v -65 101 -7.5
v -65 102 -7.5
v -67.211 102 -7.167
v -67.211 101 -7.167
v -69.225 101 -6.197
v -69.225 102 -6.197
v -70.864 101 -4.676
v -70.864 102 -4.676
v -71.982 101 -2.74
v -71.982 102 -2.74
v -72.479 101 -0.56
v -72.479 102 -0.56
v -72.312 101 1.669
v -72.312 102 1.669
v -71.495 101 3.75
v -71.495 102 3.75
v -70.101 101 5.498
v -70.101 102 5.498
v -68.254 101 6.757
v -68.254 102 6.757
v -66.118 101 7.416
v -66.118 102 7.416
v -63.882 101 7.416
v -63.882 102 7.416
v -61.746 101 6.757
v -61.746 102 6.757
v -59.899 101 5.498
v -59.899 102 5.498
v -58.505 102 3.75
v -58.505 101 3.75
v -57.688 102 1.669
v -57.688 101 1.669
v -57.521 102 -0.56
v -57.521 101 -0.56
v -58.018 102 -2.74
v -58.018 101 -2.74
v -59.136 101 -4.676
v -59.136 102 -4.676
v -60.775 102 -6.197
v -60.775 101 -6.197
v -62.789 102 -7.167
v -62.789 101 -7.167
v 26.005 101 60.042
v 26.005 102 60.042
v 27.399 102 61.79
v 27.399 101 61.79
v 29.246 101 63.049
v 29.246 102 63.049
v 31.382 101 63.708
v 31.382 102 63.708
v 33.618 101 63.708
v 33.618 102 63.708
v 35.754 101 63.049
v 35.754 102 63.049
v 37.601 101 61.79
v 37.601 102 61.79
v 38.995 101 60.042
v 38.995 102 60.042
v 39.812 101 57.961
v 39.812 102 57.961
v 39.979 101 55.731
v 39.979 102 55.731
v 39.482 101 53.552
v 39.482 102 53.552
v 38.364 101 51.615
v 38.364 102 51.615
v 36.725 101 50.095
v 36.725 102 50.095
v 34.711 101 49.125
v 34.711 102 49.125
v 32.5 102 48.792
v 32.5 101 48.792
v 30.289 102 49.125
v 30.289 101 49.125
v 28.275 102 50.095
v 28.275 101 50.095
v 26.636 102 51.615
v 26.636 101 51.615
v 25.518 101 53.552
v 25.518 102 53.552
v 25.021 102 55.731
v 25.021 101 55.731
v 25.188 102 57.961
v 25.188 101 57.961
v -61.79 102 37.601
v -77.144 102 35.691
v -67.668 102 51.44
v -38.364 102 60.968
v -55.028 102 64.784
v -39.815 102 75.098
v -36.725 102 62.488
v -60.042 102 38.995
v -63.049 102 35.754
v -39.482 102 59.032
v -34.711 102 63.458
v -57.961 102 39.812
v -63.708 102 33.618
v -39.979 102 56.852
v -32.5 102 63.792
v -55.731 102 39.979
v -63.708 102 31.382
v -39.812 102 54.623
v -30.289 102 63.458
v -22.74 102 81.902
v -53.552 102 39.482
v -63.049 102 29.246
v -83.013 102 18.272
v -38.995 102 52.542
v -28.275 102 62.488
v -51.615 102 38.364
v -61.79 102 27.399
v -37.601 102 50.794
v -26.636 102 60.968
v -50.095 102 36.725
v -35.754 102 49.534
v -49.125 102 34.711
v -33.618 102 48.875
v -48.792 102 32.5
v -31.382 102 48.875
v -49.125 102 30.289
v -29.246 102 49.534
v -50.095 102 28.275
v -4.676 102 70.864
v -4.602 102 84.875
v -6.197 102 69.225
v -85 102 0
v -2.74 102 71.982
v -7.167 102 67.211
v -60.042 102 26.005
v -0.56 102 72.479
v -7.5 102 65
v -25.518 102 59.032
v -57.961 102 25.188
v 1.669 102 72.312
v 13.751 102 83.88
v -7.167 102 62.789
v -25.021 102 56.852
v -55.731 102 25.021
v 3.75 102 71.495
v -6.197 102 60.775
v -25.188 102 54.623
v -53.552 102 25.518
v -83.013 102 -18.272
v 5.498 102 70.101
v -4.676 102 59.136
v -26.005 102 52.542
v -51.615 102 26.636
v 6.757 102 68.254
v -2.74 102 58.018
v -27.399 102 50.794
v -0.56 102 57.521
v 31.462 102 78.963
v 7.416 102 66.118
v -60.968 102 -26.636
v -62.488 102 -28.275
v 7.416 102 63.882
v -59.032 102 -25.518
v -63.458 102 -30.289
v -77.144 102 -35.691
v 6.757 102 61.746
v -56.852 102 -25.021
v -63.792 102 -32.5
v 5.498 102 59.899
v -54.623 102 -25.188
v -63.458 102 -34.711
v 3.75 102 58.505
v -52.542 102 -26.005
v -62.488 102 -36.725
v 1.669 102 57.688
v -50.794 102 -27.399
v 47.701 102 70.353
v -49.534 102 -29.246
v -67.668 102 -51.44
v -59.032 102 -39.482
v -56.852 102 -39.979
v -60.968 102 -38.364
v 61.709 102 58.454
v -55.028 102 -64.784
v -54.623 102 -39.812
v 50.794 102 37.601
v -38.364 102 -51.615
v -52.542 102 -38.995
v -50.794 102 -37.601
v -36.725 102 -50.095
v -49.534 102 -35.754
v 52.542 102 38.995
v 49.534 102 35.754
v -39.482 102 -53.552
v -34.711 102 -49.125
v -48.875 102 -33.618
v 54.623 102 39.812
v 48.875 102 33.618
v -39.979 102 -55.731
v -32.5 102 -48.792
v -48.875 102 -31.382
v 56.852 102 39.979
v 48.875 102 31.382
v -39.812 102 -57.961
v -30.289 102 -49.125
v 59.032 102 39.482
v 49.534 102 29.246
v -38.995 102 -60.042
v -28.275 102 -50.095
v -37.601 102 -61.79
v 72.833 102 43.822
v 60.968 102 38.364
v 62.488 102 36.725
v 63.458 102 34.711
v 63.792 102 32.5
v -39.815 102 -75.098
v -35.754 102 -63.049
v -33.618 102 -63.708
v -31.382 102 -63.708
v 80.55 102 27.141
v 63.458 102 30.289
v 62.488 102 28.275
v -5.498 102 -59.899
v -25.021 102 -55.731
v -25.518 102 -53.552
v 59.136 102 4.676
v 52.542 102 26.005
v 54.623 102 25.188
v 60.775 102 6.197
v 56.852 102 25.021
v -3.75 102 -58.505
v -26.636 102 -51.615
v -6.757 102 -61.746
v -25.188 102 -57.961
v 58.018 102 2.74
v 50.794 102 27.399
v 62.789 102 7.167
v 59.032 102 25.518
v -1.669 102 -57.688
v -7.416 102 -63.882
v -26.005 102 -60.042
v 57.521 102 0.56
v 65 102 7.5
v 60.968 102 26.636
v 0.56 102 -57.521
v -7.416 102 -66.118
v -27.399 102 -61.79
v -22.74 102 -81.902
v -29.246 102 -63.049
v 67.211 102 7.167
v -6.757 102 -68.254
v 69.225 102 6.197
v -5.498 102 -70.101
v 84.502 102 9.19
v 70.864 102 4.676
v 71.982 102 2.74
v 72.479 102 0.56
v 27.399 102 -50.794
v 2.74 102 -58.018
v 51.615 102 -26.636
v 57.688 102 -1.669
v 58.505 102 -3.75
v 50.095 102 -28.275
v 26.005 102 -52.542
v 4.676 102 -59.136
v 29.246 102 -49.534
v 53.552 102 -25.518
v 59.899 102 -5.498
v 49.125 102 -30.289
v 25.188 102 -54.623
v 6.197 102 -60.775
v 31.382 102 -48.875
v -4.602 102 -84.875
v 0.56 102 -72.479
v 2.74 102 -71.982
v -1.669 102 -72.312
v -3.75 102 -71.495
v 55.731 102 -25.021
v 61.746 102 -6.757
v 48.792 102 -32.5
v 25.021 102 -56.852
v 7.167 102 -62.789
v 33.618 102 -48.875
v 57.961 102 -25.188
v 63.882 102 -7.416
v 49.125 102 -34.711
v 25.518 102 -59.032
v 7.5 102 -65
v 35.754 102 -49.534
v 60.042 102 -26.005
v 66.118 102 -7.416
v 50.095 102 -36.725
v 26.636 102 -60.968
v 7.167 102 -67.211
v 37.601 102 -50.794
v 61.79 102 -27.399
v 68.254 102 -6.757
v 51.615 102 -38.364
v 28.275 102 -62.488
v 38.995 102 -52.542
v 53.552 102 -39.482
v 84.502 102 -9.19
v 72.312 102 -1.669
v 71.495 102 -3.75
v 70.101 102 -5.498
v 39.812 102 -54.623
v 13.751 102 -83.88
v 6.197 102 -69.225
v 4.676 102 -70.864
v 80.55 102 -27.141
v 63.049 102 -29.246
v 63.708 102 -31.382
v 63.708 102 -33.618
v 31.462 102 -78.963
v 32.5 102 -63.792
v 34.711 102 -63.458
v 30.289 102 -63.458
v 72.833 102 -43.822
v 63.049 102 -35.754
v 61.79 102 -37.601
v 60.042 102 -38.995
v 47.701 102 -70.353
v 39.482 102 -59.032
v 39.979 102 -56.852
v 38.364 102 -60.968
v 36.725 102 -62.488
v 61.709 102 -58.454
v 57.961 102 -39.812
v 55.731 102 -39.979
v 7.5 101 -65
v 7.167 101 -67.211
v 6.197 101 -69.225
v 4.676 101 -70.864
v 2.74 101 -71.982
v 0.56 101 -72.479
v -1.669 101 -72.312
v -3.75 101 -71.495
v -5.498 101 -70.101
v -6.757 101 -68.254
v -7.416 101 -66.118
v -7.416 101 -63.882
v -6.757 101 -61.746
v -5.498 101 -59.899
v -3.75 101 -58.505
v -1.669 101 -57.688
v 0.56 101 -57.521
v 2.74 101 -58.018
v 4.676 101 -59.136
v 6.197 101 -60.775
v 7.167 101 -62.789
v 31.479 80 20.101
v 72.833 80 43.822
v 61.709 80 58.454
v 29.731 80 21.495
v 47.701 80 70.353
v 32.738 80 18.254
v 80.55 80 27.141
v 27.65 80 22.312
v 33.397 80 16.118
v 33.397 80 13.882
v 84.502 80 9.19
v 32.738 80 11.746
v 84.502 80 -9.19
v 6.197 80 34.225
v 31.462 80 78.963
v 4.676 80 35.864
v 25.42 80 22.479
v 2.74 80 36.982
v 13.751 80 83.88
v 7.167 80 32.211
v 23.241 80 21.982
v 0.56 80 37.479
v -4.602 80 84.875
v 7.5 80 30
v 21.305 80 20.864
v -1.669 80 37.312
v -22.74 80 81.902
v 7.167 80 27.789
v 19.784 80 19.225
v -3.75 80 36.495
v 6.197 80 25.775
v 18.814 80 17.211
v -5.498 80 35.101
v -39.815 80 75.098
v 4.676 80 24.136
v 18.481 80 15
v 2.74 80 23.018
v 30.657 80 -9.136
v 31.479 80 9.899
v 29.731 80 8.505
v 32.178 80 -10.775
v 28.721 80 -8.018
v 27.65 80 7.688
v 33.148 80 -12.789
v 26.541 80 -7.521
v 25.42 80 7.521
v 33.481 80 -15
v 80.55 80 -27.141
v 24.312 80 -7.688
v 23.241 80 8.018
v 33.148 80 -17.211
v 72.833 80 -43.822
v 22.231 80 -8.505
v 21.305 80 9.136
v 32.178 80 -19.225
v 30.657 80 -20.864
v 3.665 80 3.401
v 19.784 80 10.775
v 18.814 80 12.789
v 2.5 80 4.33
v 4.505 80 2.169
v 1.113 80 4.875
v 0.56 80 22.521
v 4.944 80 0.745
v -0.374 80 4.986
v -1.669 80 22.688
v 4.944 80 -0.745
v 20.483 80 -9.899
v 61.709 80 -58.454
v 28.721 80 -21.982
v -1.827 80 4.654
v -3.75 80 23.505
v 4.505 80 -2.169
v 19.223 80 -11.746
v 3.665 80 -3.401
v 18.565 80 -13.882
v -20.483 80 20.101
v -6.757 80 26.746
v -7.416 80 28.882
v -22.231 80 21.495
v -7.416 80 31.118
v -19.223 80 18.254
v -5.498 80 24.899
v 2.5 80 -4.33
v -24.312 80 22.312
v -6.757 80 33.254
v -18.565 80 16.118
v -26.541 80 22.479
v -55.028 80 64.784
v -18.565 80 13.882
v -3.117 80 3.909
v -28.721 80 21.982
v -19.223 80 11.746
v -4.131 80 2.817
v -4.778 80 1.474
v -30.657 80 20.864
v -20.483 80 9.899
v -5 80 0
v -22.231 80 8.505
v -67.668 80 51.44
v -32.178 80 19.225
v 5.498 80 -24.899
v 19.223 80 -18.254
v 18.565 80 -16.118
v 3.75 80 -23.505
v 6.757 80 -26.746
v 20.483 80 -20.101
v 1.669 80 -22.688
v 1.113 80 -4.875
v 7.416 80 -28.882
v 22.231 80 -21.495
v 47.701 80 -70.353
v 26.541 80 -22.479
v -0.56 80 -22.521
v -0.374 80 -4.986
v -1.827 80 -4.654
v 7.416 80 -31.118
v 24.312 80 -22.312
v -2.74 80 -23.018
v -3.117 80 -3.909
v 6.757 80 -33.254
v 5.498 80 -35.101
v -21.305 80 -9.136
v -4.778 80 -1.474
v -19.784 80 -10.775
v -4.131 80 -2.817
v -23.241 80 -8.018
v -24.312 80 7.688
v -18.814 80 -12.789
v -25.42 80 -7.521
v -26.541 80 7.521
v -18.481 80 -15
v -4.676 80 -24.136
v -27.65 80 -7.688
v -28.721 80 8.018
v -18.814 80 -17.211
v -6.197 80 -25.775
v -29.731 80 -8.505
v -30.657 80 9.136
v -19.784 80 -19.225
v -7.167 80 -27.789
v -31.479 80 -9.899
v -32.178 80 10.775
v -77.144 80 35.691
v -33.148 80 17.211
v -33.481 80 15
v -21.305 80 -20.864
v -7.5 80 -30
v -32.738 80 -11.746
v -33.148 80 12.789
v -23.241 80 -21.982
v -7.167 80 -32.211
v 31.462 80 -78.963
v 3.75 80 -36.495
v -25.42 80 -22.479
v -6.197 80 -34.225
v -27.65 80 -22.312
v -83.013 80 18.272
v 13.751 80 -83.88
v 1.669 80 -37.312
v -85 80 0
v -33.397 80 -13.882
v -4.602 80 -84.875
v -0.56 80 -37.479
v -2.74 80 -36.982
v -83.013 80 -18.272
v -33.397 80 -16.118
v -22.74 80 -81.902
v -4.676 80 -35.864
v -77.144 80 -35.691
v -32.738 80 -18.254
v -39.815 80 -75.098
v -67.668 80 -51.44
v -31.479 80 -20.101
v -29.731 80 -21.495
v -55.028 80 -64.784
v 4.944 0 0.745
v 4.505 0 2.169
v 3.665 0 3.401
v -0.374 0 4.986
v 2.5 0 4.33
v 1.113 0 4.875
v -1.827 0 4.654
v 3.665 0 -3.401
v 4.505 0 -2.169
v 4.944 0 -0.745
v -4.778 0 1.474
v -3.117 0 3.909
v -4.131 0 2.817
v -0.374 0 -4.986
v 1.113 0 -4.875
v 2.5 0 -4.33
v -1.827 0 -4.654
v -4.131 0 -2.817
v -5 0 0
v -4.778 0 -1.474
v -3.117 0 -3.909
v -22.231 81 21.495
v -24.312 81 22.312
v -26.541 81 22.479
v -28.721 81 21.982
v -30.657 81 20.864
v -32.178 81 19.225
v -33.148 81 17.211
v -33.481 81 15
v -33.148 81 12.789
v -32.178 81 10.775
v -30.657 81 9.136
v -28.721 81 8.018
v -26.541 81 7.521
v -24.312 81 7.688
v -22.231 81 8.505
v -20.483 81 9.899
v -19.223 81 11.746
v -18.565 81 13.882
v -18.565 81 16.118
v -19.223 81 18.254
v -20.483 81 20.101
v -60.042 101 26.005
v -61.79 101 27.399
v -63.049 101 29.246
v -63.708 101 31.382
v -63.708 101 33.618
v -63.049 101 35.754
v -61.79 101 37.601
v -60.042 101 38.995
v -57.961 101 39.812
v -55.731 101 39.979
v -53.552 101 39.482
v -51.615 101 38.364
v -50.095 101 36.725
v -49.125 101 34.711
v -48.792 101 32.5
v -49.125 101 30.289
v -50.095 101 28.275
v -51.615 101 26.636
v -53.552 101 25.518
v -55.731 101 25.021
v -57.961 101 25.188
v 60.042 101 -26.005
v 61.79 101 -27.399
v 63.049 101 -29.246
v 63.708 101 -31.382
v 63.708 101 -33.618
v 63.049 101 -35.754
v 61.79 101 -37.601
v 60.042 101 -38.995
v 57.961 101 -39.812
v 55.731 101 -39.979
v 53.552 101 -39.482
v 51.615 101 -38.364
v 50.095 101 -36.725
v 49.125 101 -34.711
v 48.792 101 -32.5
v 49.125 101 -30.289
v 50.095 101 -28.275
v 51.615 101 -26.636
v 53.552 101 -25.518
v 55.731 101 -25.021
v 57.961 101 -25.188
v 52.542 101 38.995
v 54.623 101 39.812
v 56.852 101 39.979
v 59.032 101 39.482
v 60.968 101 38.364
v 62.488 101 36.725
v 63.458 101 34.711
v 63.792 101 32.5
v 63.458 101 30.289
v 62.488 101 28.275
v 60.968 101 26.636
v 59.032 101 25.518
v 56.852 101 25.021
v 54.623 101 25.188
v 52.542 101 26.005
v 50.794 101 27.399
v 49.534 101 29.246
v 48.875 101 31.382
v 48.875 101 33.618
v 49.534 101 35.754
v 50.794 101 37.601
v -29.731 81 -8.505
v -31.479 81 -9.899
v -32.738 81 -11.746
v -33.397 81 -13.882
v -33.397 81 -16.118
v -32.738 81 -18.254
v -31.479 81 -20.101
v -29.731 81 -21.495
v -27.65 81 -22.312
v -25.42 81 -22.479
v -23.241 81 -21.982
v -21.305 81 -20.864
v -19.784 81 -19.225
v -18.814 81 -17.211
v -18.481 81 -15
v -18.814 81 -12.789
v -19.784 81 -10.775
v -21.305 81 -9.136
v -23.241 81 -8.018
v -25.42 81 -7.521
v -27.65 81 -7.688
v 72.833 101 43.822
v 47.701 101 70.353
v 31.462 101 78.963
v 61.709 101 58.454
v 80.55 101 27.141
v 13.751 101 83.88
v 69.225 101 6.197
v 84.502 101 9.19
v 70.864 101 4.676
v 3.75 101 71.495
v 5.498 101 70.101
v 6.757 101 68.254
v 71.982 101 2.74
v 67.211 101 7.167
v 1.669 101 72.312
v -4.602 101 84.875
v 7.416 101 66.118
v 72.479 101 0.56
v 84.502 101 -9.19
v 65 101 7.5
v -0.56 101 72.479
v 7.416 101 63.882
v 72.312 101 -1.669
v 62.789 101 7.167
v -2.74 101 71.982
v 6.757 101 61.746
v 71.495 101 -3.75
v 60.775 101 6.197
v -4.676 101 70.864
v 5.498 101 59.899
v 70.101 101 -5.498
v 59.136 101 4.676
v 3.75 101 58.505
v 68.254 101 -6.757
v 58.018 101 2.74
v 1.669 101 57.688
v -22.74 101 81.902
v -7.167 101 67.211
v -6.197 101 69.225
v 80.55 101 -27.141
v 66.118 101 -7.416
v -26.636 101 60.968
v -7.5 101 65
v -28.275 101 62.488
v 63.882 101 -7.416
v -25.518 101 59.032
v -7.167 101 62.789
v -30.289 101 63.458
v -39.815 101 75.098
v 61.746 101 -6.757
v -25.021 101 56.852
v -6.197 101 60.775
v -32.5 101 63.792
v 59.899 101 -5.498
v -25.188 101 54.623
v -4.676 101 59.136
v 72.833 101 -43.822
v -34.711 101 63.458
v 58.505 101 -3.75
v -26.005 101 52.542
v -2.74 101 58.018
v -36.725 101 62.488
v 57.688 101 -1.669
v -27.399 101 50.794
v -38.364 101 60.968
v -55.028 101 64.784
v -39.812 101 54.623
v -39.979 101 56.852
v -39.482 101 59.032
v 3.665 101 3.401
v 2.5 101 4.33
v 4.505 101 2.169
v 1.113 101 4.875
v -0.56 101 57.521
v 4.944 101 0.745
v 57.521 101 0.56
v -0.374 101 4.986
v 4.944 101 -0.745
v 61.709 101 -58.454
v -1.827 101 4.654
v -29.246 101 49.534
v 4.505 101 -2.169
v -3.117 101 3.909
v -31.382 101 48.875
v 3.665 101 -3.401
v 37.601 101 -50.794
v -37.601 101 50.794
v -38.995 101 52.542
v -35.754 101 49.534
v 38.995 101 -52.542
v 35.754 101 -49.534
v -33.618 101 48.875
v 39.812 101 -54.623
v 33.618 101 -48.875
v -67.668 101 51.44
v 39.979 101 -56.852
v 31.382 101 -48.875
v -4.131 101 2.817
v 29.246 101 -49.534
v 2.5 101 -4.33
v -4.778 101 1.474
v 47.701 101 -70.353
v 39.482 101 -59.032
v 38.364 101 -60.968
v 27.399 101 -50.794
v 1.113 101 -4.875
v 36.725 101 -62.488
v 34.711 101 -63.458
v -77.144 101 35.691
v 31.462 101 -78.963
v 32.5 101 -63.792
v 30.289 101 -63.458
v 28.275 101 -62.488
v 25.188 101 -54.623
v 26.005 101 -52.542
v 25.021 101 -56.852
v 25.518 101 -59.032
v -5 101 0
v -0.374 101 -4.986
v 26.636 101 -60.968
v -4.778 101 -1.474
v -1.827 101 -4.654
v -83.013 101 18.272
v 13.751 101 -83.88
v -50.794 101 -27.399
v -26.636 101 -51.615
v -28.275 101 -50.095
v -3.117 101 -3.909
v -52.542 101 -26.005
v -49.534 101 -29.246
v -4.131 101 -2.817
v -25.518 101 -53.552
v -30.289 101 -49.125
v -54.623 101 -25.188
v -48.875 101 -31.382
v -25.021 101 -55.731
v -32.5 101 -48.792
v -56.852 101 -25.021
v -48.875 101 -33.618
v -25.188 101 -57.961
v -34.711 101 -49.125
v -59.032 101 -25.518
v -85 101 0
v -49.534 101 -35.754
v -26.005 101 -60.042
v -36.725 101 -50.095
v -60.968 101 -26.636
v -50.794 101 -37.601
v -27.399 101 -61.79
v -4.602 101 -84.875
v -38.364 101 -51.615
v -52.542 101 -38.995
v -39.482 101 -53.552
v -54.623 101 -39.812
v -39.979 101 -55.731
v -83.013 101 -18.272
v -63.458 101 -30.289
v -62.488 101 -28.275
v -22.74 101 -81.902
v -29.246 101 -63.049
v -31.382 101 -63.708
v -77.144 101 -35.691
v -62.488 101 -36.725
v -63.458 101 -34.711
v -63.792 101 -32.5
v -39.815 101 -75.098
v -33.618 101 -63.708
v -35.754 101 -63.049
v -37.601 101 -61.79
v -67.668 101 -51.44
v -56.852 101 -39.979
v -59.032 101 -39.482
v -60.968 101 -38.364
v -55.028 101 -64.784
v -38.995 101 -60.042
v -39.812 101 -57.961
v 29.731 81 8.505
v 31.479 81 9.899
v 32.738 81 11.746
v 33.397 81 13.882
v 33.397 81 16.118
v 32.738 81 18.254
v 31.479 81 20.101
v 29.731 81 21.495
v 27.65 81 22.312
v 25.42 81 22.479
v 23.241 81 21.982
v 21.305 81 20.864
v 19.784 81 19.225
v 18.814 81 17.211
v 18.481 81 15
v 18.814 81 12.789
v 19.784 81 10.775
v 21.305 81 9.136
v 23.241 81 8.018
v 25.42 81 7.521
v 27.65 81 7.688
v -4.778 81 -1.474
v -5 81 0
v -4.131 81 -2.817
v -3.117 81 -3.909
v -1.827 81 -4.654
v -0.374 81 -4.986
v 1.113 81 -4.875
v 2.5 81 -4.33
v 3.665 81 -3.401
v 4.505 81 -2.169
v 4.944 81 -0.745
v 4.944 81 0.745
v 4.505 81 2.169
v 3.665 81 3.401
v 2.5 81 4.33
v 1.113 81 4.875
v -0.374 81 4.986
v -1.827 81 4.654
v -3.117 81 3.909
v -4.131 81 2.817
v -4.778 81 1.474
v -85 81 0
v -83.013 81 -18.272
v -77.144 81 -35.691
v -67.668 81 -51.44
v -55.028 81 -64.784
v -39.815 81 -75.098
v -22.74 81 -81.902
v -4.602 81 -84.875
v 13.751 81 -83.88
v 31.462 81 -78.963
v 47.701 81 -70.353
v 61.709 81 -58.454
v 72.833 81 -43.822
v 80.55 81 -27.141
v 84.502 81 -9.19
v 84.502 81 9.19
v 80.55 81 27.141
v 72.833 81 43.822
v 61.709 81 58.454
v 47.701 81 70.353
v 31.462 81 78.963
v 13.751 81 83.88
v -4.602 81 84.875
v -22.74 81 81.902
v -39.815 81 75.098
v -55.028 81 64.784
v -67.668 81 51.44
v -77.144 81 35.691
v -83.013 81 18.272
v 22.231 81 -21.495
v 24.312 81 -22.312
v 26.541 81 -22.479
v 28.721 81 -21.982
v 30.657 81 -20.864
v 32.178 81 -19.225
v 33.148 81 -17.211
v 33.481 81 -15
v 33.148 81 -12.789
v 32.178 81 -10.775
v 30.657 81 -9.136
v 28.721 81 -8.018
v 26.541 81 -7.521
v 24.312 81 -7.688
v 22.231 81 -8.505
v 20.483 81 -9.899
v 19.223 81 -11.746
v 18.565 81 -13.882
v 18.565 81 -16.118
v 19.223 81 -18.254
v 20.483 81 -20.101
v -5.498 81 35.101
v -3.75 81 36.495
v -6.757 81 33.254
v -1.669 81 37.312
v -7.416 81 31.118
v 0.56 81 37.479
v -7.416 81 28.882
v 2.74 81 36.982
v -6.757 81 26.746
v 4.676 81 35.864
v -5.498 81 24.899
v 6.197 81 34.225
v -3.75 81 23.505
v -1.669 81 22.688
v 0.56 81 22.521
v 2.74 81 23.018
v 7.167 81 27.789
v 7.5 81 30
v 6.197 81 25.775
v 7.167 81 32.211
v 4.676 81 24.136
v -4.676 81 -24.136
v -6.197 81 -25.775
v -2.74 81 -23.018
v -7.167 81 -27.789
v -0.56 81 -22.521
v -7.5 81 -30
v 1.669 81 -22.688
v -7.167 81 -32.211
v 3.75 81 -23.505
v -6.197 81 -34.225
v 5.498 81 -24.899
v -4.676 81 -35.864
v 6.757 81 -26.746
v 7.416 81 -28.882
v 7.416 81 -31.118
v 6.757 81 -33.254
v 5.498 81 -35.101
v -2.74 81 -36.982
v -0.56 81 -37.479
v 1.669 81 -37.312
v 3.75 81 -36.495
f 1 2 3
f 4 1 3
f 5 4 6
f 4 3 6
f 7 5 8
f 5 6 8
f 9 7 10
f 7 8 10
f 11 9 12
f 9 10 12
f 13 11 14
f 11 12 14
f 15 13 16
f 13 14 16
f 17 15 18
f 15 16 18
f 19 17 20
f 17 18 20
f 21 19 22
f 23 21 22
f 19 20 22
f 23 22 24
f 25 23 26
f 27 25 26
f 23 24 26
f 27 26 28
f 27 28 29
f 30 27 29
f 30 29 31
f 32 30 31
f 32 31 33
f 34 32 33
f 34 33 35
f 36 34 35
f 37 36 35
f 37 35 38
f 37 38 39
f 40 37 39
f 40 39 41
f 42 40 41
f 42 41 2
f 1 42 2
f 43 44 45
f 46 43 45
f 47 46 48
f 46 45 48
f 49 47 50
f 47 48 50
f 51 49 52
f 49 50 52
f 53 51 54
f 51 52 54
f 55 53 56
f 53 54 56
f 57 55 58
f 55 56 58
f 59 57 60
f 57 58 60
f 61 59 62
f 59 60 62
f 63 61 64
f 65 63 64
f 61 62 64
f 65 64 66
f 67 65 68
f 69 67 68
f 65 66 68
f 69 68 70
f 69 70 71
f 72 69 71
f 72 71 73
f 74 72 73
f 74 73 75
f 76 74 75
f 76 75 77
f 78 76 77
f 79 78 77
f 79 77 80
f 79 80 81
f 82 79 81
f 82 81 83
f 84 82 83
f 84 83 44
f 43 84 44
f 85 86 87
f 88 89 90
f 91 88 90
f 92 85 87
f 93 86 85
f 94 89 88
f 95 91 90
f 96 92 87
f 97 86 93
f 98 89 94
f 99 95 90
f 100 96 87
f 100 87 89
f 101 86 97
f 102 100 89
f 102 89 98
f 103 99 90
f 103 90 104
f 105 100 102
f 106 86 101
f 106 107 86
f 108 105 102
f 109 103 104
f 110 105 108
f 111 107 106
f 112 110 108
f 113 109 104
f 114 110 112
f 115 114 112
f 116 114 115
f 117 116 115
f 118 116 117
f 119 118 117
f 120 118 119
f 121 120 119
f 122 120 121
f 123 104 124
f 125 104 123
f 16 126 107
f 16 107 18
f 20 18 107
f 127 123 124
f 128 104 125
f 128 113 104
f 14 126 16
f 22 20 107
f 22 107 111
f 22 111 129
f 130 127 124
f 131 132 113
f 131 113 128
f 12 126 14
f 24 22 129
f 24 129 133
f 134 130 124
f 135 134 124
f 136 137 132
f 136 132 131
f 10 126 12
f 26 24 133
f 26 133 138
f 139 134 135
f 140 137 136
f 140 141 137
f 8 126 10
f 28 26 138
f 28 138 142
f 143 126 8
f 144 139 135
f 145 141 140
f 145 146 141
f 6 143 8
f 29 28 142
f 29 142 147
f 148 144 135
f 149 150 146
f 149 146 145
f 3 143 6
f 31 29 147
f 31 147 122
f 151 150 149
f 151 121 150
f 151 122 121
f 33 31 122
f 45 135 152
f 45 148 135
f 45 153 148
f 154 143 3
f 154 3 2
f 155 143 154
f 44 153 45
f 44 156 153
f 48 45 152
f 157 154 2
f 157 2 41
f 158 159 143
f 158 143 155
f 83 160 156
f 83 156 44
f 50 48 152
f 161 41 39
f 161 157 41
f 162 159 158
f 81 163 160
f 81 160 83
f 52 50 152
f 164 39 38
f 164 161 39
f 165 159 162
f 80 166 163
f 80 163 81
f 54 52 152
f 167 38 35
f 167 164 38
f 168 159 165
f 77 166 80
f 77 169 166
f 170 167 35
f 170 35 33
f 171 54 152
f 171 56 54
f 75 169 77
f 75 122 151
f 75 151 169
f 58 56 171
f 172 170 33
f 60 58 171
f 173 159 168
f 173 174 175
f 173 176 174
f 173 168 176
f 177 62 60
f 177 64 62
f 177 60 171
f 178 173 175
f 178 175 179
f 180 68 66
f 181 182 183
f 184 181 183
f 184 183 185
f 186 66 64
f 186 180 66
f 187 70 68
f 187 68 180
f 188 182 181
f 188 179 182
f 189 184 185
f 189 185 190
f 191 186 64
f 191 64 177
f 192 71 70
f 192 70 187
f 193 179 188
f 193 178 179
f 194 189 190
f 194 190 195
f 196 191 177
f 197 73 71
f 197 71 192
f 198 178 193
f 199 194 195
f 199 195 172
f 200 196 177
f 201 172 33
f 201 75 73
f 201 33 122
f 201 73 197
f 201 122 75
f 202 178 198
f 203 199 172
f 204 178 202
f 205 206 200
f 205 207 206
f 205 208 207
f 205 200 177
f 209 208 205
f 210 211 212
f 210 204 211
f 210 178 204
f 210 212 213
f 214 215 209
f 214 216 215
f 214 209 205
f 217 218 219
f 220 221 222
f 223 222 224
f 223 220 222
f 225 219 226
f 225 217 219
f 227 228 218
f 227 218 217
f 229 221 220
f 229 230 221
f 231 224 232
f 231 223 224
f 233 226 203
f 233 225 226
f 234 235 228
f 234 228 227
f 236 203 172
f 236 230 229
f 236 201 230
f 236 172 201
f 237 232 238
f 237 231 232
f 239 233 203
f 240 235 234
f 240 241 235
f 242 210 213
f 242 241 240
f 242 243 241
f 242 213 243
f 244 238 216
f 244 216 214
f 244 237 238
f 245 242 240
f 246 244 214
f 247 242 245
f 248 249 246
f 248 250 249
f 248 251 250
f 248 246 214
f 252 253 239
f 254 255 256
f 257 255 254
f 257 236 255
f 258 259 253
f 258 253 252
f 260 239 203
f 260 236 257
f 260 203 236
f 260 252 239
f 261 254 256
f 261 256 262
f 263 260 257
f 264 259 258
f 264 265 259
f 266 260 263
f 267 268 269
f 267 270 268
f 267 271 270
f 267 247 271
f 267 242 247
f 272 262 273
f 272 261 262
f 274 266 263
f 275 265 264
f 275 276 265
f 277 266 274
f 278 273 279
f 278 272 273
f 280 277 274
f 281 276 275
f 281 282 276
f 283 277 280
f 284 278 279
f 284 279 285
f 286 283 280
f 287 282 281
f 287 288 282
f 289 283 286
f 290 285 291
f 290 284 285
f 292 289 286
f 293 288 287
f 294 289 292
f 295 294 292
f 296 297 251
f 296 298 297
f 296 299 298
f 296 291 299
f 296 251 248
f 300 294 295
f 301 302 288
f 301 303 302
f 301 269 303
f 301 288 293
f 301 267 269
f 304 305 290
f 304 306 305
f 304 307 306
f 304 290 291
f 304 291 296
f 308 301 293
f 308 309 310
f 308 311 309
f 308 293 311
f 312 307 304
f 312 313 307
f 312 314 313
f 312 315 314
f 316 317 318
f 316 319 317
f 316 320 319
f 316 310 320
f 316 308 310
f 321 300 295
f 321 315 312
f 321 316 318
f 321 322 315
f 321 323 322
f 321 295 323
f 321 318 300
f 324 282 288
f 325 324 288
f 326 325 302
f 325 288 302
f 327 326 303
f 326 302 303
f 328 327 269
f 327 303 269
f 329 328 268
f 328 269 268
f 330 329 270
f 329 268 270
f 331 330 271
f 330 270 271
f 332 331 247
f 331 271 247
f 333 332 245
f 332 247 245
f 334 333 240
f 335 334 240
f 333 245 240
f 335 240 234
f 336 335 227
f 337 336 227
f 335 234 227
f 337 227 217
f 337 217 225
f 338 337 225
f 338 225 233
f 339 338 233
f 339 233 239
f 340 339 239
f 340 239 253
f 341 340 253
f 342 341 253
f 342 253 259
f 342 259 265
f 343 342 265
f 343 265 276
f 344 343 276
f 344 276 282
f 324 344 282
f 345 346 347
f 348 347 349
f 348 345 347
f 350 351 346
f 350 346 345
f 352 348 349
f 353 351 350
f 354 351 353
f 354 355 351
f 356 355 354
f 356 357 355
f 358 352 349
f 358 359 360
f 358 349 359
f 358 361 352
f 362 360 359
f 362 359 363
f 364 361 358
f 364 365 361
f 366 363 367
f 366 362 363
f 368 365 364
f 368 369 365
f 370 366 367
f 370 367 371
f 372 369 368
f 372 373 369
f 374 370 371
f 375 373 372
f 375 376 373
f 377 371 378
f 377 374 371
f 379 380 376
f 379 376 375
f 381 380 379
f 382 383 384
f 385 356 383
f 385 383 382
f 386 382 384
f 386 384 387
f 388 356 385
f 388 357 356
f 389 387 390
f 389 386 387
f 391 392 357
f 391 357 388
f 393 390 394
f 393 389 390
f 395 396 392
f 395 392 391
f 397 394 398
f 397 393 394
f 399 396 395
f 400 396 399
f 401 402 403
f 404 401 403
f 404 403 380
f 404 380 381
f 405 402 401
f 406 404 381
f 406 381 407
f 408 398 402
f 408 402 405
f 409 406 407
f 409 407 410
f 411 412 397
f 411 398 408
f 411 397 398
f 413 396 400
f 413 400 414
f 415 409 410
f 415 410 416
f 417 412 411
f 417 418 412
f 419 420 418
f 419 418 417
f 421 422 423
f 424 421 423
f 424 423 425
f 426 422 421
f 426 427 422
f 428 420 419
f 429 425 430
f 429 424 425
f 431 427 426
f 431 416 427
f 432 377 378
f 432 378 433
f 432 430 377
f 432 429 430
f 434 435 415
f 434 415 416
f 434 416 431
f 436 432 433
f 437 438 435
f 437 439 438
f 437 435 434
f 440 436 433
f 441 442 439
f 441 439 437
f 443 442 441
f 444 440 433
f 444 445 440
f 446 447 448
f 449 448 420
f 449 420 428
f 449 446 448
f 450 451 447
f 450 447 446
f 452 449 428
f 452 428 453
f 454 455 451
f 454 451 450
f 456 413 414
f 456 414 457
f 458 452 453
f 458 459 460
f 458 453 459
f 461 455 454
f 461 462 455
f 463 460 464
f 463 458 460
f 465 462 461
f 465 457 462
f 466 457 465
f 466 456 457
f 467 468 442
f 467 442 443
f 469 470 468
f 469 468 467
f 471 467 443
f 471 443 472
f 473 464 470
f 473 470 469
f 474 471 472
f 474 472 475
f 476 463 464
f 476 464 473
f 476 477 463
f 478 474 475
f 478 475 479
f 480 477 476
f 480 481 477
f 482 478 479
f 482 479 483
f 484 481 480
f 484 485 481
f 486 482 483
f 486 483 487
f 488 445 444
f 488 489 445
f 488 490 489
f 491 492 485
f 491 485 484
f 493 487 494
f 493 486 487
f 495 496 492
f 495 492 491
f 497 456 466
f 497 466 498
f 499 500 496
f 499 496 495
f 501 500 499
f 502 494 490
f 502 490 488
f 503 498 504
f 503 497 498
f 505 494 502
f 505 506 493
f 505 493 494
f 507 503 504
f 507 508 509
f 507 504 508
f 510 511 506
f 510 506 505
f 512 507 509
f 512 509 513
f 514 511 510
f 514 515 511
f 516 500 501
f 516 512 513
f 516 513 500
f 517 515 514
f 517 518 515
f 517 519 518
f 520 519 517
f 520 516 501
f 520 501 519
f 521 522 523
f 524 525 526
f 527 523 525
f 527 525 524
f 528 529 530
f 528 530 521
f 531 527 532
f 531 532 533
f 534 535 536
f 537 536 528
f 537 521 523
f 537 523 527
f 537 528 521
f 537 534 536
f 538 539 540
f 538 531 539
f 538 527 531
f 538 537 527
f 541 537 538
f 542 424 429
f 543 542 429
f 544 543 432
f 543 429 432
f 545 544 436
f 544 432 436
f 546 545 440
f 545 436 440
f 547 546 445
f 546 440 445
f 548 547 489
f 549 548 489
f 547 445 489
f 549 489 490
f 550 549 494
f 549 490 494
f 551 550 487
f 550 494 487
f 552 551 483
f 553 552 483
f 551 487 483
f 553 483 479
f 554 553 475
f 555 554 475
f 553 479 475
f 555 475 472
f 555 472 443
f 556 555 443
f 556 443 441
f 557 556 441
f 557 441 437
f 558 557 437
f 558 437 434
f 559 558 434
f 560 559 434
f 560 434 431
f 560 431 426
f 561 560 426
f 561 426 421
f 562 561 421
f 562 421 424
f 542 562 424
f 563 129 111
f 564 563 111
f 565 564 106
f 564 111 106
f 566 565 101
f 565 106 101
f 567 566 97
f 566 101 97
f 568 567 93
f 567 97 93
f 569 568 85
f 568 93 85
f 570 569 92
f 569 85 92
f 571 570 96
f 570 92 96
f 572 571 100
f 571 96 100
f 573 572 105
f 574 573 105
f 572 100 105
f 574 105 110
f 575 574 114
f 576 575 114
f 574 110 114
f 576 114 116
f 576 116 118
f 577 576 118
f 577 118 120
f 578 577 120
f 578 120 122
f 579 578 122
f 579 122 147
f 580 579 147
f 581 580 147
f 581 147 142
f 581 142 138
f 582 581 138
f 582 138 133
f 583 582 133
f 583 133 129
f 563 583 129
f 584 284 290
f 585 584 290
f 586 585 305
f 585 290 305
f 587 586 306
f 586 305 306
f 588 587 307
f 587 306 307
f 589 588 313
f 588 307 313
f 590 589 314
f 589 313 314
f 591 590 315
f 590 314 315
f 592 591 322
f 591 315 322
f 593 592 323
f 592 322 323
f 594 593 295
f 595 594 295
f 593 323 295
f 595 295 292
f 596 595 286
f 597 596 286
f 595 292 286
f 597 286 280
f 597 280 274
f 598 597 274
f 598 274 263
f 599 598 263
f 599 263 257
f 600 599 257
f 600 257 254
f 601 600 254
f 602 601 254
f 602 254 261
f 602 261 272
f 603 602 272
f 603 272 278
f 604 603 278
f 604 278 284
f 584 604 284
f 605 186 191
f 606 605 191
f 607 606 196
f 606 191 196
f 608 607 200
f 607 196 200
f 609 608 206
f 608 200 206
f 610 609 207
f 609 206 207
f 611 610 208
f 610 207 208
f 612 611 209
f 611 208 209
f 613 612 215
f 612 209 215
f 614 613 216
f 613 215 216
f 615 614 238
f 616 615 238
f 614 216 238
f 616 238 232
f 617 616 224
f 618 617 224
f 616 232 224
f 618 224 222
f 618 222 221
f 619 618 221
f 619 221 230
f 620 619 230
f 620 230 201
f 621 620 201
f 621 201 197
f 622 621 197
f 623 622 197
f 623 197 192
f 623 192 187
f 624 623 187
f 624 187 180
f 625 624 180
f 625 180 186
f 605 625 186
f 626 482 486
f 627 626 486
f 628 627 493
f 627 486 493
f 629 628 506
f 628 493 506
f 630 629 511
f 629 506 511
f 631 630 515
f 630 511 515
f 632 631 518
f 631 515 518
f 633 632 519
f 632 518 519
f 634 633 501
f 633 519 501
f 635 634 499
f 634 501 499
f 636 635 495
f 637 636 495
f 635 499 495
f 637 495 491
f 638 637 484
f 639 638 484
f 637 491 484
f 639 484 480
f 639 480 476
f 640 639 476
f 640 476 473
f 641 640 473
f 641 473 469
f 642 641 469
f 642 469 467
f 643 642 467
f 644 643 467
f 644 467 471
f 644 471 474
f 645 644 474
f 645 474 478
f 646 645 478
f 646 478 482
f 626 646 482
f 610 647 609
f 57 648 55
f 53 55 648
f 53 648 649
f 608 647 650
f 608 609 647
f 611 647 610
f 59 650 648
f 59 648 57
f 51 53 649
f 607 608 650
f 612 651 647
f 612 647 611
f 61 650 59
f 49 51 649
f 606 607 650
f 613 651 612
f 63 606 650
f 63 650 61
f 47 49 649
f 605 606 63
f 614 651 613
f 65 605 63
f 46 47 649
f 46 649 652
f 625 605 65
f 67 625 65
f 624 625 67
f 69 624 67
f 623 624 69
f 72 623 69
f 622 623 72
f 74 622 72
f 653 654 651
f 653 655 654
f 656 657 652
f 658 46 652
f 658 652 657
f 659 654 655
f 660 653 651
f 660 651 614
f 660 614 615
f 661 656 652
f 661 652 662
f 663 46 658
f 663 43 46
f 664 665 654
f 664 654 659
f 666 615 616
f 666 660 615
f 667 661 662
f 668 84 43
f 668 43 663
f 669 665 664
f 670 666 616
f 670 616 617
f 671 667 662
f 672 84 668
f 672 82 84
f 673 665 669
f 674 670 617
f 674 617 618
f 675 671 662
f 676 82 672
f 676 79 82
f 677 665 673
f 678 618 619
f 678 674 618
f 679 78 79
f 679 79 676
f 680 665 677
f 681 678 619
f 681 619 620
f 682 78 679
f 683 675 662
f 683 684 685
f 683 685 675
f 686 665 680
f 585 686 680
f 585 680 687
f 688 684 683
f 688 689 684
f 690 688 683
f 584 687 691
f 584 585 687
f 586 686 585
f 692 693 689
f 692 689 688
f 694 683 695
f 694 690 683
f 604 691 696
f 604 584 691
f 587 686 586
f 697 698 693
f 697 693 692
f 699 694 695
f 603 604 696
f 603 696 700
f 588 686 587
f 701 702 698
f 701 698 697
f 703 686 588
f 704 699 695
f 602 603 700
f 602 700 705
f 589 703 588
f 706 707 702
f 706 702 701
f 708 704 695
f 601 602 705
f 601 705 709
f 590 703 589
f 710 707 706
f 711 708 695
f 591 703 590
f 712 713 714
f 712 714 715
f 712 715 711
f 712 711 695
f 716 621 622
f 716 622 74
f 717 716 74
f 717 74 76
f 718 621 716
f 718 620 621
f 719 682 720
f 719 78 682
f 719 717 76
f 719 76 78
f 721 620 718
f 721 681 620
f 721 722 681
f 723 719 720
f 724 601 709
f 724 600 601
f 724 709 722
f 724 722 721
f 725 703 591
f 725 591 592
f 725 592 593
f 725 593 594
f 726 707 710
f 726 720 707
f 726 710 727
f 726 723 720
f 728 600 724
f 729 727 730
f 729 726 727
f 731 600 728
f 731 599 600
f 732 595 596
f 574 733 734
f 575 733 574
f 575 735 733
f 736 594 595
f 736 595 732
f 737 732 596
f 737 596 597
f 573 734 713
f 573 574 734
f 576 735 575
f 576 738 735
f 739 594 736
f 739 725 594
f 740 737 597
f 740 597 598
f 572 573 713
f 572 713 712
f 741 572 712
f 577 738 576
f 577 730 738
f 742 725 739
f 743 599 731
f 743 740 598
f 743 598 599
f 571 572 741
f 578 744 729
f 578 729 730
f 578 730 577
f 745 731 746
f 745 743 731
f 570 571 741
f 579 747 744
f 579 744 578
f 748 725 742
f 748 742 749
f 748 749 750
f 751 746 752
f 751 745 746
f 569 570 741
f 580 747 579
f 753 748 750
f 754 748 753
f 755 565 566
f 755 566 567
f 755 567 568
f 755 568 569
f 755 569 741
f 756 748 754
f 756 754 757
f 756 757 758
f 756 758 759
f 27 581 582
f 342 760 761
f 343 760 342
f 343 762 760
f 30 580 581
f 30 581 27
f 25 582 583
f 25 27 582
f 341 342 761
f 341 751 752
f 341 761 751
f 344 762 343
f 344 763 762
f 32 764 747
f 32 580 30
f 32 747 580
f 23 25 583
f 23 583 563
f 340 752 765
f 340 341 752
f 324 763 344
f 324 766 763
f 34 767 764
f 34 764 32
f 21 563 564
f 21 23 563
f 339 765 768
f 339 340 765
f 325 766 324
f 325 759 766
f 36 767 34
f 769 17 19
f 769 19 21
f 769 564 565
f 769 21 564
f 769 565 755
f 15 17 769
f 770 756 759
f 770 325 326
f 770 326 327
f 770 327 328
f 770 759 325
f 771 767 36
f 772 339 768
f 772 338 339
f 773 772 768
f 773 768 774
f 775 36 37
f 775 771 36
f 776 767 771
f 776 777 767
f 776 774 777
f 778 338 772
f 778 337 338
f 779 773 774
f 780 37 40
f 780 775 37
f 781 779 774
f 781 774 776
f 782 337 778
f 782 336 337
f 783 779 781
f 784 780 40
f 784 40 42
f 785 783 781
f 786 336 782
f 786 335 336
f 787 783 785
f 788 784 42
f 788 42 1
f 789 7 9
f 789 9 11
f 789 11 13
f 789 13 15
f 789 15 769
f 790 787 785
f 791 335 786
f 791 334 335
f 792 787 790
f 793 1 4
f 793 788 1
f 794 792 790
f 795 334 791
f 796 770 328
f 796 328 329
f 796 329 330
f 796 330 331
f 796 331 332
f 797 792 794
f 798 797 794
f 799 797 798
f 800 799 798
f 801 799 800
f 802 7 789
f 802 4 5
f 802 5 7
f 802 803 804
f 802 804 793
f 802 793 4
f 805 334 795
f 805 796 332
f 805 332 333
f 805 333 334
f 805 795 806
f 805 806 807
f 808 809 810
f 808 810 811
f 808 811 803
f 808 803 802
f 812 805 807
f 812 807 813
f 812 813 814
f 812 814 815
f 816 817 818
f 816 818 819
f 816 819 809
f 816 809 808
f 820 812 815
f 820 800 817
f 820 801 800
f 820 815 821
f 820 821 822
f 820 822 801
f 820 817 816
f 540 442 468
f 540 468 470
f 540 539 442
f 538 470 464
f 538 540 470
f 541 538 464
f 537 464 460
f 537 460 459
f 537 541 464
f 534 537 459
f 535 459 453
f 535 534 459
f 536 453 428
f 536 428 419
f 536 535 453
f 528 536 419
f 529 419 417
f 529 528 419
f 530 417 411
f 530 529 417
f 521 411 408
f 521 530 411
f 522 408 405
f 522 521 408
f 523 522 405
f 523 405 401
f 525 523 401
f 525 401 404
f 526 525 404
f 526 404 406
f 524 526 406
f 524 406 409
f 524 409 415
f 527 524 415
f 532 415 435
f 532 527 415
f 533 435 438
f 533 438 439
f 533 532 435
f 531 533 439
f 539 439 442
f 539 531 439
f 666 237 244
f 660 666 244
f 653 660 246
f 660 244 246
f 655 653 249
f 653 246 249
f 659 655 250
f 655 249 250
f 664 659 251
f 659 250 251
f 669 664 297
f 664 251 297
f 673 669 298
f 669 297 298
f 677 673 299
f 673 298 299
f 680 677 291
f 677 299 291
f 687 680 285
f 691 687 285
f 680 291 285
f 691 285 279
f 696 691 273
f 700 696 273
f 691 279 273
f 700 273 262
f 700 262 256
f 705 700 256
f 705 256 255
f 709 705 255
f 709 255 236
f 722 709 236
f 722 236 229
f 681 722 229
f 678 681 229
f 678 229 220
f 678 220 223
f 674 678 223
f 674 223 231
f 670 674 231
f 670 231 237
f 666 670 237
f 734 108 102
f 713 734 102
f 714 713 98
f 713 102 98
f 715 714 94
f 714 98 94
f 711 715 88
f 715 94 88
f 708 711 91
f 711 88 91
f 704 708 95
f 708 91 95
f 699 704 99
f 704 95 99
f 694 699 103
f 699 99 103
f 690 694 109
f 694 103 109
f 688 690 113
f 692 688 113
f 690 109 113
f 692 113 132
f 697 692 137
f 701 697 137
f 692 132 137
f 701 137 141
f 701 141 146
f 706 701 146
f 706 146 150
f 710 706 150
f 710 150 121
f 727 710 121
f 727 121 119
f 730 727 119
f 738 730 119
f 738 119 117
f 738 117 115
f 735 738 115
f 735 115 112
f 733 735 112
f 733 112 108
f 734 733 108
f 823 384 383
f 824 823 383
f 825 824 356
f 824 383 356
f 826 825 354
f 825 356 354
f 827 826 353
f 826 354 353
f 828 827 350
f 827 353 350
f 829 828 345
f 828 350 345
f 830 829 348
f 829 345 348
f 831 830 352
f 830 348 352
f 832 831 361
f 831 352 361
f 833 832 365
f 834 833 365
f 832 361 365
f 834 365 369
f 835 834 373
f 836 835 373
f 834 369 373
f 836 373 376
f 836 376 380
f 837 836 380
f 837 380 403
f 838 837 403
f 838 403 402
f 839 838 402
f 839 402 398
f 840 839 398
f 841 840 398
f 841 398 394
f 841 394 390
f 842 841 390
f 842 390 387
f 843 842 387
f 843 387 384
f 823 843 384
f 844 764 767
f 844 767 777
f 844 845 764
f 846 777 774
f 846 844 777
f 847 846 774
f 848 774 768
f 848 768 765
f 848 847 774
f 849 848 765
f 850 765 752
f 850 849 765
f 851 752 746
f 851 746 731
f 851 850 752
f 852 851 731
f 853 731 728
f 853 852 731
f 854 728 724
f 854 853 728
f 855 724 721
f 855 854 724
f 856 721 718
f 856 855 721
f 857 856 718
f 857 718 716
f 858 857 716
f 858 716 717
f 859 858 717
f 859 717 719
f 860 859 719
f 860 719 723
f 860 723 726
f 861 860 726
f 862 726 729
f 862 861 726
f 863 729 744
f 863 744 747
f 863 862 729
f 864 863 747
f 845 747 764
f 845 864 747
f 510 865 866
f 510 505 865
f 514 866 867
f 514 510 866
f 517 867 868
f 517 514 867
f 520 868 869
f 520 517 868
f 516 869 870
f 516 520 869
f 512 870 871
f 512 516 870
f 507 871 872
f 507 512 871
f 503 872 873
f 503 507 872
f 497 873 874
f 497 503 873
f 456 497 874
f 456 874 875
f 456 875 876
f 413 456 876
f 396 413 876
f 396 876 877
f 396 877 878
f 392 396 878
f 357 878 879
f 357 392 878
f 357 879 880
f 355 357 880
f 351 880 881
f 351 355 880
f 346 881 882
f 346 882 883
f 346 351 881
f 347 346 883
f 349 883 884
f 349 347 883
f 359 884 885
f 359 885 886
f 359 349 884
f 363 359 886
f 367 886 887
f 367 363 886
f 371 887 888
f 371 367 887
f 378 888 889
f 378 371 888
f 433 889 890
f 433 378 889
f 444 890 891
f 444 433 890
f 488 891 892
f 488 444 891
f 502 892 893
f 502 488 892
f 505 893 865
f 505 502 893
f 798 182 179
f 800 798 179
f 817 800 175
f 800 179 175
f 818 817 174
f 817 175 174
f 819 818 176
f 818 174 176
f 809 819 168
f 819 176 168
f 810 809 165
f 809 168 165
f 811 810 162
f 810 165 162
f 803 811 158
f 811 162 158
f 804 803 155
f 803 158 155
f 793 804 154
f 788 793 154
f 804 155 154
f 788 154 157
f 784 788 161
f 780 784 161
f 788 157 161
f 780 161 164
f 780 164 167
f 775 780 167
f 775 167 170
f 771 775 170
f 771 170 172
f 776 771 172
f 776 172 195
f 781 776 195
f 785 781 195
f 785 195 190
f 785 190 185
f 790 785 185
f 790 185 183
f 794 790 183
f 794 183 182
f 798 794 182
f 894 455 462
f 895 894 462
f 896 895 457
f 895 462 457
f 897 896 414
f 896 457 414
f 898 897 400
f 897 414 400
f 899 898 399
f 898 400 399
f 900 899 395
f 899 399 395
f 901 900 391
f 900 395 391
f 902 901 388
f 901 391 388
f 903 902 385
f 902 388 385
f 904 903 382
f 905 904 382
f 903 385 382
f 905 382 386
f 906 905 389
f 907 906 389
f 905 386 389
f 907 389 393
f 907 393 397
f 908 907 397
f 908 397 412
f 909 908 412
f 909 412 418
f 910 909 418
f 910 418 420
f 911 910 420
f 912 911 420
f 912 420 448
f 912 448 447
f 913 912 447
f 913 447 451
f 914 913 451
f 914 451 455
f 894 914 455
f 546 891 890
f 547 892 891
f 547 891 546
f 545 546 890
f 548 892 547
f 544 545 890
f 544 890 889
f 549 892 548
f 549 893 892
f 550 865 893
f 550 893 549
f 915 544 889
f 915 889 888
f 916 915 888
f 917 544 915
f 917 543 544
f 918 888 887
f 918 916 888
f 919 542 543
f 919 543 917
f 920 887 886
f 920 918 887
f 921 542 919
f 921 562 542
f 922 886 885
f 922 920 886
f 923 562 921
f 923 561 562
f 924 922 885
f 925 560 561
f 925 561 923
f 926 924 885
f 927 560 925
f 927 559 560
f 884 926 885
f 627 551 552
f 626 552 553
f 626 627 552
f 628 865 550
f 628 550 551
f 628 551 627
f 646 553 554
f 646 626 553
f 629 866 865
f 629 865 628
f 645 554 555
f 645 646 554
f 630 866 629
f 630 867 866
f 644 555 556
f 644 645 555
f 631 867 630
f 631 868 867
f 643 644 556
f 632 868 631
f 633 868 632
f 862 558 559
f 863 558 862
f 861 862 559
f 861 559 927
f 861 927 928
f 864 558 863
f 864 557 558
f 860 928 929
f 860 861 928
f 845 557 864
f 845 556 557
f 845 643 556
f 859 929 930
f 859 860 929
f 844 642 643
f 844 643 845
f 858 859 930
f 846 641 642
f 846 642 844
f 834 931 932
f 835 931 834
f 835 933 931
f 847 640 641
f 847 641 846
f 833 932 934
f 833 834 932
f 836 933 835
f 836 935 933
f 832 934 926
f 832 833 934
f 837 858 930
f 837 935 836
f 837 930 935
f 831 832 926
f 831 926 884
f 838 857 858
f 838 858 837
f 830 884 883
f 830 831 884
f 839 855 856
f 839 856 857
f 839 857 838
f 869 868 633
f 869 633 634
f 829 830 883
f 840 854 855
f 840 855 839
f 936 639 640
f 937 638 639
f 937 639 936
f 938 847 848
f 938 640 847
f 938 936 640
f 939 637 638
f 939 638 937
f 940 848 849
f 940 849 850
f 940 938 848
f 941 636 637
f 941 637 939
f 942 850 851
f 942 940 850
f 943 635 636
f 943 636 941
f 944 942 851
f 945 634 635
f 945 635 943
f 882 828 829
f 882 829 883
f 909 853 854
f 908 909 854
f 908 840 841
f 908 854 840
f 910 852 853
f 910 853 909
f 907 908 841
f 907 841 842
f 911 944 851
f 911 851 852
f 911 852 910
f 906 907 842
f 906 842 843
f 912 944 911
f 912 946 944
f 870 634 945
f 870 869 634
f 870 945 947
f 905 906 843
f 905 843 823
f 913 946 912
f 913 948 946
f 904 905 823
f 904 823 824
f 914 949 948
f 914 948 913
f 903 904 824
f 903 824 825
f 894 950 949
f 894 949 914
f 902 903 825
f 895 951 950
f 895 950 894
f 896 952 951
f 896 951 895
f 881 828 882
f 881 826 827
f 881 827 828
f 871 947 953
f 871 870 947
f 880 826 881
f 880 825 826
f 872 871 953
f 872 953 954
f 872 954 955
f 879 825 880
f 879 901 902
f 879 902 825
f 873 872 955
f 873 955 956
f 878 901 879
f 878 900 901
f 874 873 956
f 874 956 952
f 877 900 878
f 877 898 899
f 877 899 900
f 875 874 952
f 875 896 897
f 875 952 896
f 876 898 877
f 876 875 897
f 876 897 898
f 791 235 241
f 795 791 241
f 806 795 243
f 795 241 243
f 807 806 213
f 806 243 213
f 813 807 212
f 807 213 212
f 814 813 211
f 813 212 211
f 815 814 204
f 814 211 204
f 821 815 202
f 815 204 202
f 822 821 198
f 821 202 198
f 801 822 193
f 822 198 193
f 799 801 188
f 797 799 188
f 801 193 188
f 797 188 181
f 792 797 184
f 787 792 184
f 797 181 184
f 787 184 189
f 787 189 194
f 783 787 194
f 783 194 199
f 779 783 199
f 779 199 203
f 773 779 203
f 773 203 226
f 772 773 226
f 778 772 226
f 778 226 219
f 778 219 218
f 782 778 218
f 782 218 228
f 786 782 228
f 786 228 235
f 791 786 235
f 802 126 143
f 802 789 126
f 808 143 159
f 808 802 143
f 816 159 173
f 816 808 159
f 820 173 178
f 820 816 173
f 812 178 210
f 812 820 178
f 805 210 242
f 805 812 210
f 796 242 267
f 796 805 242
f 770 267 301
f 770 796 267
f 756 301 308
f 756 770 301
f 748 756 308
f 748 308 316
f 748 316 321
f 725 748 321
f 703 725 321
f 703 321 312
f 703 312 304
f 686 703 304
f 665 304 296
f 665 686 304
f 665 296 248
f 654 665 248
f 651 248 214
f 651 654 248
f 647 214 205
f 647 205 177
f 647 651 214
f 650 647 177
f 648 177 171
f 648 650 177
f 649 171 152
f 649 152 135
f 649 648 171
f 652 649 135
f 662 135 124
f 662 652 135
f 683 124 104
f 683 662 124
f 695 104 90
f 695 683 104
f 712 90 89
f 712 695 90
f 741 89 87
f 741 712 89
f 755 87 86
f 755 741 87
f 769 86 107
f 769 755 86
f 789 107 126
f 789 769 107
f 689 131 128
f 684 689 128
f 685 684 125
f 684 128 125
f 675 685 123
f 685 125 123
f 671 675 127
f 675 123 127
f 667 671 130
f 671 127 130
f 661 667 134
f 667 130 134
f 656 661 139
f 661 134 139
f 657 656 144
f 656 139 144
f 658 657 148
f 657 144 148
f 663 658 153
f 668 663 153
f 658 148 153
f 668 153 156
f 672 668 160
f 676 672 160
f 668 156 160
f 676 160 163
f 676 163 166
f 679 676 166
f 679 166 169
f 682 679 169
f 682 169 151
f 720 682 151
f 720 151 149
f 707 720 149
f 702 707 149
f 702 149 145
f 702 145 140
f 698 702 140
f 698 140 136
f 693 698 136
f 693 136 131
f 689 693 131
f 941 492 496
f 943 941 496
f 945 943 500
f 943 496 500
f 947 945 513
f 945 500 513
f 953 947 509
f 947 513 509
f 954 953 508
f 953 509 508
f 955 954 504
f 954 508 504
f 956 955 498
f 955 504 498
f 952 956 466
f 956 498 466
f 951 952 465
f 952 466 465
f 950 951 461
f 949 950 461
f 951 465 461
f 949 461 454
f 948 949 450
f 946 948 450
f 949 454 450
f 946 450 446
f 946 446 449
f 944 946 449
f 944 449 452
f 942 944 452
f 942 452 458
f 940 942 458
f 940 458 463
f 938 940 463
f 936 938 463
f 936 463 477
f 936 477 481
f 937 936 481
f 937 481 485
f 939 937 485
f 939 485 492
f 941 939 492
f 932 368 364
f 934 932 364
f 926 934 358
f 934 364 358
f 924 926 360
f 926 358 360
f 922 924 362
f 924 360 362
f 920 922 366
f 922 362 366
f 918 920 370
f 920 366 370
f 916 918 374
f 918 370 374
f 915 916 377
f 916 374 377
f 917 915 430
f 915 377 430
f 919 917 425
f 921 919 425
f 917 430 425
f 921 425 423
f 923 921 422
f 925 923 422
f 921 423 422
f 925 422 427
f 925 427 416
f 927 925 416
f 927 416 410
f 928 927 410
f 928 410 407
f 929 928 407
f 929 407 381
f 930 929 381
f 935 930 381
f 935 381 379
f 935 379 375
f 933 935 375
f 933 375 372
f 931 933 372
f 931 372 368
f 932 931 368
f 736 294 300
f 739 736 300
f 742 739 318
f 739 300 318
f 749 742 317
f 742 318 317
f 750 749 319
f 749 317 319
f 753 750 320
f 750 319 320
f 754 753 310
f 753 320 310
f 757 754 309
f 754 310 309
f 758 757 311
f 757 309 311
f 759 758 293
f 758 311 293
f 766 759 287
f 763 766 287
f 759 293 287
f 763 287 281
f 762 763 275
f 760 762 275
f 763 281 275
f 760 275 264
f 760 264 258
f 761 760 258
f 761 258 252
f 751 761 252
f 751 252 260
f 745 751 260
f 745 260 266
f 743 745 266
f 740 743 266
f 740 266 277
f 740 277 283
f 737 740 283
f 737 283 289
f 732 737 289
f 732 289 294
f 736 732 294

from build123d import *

# Parameters (mm, degrees)
SKETCH2_R          = 7.5
CUT_EXTRUDE1_DEPTH = 2
CIRPATTERN1_COUNT  = 12
SKETCH3_R          = 7.5
CUT_EXTRUDE2_DEPTH = 2
CIRPATTERN2_COUNT  = 6


with BuildPart() as part:
    # Sketch1 → Revolve1 (revolve)
    with BuildSketch(Plane.XY):
        Polygon((0, 102), (-84.99983, 102), (-84.99983, 101), (-5, 101), (-5, 81), (-84.99983, 81), (-84.99983, 80), (-5, 80), (-5, 0), (0, 0), align=None)
    revolve(axis=Axis((0, 54.874193188, 0), (0, -1, 0)))

    # Sketch2 → Cut-Extrude1 (cut)
    with BuildSketch(Plane(origin=(0, 102, 0), x_dir=(1, 0, 0), z_dir=(0, 1, 0))):
        with Locations((0, 65)):
            Circle(SKETCH2_R)
    cut_extrude1 = extrude(amount=-CUT_EXTRUDE1_DEPTH, mode=Mode.SUBTRACT)

    # CirPattern1: Cut-Extrude1 ×12 about axis
    cirpattern1_axis = Axis((0, 0, 0), (0, 1, 0))
    for i in range(1, CIRPATTERN1_COUNT):
        add(cut_extrude1.rotate(cirpattern1_axis, i * 360 / CIRPATTERN1_COUNT), mode=Mode.SUBTRACT)

    # Sketch3 → Cut-Extrude2 (cut)
    with BuildSketch(Plane.XZ.offset(-80)):
        with Locations((0, 30)):
            Circle(SKETCH3_R)
    cut_extrude2 = extrude(amount=-CUT_EXTRUDE2_DEPTH, mode=Mode.SUBTRACT)

    # CirPattern2: Cut-Extrude2 ×6 about axis
    cirpattern2_axis = Axis((0, 0, 0), (0, 1, 0))
    for i in range(1, CIRPATTERN2_COUNT):
        add(cut_extrude2.rotate(cirpattern2_axis, i * 360 / CIRPATTERN2_COUNT), mode=Mode.SUBTRACT)


solid = part.part
